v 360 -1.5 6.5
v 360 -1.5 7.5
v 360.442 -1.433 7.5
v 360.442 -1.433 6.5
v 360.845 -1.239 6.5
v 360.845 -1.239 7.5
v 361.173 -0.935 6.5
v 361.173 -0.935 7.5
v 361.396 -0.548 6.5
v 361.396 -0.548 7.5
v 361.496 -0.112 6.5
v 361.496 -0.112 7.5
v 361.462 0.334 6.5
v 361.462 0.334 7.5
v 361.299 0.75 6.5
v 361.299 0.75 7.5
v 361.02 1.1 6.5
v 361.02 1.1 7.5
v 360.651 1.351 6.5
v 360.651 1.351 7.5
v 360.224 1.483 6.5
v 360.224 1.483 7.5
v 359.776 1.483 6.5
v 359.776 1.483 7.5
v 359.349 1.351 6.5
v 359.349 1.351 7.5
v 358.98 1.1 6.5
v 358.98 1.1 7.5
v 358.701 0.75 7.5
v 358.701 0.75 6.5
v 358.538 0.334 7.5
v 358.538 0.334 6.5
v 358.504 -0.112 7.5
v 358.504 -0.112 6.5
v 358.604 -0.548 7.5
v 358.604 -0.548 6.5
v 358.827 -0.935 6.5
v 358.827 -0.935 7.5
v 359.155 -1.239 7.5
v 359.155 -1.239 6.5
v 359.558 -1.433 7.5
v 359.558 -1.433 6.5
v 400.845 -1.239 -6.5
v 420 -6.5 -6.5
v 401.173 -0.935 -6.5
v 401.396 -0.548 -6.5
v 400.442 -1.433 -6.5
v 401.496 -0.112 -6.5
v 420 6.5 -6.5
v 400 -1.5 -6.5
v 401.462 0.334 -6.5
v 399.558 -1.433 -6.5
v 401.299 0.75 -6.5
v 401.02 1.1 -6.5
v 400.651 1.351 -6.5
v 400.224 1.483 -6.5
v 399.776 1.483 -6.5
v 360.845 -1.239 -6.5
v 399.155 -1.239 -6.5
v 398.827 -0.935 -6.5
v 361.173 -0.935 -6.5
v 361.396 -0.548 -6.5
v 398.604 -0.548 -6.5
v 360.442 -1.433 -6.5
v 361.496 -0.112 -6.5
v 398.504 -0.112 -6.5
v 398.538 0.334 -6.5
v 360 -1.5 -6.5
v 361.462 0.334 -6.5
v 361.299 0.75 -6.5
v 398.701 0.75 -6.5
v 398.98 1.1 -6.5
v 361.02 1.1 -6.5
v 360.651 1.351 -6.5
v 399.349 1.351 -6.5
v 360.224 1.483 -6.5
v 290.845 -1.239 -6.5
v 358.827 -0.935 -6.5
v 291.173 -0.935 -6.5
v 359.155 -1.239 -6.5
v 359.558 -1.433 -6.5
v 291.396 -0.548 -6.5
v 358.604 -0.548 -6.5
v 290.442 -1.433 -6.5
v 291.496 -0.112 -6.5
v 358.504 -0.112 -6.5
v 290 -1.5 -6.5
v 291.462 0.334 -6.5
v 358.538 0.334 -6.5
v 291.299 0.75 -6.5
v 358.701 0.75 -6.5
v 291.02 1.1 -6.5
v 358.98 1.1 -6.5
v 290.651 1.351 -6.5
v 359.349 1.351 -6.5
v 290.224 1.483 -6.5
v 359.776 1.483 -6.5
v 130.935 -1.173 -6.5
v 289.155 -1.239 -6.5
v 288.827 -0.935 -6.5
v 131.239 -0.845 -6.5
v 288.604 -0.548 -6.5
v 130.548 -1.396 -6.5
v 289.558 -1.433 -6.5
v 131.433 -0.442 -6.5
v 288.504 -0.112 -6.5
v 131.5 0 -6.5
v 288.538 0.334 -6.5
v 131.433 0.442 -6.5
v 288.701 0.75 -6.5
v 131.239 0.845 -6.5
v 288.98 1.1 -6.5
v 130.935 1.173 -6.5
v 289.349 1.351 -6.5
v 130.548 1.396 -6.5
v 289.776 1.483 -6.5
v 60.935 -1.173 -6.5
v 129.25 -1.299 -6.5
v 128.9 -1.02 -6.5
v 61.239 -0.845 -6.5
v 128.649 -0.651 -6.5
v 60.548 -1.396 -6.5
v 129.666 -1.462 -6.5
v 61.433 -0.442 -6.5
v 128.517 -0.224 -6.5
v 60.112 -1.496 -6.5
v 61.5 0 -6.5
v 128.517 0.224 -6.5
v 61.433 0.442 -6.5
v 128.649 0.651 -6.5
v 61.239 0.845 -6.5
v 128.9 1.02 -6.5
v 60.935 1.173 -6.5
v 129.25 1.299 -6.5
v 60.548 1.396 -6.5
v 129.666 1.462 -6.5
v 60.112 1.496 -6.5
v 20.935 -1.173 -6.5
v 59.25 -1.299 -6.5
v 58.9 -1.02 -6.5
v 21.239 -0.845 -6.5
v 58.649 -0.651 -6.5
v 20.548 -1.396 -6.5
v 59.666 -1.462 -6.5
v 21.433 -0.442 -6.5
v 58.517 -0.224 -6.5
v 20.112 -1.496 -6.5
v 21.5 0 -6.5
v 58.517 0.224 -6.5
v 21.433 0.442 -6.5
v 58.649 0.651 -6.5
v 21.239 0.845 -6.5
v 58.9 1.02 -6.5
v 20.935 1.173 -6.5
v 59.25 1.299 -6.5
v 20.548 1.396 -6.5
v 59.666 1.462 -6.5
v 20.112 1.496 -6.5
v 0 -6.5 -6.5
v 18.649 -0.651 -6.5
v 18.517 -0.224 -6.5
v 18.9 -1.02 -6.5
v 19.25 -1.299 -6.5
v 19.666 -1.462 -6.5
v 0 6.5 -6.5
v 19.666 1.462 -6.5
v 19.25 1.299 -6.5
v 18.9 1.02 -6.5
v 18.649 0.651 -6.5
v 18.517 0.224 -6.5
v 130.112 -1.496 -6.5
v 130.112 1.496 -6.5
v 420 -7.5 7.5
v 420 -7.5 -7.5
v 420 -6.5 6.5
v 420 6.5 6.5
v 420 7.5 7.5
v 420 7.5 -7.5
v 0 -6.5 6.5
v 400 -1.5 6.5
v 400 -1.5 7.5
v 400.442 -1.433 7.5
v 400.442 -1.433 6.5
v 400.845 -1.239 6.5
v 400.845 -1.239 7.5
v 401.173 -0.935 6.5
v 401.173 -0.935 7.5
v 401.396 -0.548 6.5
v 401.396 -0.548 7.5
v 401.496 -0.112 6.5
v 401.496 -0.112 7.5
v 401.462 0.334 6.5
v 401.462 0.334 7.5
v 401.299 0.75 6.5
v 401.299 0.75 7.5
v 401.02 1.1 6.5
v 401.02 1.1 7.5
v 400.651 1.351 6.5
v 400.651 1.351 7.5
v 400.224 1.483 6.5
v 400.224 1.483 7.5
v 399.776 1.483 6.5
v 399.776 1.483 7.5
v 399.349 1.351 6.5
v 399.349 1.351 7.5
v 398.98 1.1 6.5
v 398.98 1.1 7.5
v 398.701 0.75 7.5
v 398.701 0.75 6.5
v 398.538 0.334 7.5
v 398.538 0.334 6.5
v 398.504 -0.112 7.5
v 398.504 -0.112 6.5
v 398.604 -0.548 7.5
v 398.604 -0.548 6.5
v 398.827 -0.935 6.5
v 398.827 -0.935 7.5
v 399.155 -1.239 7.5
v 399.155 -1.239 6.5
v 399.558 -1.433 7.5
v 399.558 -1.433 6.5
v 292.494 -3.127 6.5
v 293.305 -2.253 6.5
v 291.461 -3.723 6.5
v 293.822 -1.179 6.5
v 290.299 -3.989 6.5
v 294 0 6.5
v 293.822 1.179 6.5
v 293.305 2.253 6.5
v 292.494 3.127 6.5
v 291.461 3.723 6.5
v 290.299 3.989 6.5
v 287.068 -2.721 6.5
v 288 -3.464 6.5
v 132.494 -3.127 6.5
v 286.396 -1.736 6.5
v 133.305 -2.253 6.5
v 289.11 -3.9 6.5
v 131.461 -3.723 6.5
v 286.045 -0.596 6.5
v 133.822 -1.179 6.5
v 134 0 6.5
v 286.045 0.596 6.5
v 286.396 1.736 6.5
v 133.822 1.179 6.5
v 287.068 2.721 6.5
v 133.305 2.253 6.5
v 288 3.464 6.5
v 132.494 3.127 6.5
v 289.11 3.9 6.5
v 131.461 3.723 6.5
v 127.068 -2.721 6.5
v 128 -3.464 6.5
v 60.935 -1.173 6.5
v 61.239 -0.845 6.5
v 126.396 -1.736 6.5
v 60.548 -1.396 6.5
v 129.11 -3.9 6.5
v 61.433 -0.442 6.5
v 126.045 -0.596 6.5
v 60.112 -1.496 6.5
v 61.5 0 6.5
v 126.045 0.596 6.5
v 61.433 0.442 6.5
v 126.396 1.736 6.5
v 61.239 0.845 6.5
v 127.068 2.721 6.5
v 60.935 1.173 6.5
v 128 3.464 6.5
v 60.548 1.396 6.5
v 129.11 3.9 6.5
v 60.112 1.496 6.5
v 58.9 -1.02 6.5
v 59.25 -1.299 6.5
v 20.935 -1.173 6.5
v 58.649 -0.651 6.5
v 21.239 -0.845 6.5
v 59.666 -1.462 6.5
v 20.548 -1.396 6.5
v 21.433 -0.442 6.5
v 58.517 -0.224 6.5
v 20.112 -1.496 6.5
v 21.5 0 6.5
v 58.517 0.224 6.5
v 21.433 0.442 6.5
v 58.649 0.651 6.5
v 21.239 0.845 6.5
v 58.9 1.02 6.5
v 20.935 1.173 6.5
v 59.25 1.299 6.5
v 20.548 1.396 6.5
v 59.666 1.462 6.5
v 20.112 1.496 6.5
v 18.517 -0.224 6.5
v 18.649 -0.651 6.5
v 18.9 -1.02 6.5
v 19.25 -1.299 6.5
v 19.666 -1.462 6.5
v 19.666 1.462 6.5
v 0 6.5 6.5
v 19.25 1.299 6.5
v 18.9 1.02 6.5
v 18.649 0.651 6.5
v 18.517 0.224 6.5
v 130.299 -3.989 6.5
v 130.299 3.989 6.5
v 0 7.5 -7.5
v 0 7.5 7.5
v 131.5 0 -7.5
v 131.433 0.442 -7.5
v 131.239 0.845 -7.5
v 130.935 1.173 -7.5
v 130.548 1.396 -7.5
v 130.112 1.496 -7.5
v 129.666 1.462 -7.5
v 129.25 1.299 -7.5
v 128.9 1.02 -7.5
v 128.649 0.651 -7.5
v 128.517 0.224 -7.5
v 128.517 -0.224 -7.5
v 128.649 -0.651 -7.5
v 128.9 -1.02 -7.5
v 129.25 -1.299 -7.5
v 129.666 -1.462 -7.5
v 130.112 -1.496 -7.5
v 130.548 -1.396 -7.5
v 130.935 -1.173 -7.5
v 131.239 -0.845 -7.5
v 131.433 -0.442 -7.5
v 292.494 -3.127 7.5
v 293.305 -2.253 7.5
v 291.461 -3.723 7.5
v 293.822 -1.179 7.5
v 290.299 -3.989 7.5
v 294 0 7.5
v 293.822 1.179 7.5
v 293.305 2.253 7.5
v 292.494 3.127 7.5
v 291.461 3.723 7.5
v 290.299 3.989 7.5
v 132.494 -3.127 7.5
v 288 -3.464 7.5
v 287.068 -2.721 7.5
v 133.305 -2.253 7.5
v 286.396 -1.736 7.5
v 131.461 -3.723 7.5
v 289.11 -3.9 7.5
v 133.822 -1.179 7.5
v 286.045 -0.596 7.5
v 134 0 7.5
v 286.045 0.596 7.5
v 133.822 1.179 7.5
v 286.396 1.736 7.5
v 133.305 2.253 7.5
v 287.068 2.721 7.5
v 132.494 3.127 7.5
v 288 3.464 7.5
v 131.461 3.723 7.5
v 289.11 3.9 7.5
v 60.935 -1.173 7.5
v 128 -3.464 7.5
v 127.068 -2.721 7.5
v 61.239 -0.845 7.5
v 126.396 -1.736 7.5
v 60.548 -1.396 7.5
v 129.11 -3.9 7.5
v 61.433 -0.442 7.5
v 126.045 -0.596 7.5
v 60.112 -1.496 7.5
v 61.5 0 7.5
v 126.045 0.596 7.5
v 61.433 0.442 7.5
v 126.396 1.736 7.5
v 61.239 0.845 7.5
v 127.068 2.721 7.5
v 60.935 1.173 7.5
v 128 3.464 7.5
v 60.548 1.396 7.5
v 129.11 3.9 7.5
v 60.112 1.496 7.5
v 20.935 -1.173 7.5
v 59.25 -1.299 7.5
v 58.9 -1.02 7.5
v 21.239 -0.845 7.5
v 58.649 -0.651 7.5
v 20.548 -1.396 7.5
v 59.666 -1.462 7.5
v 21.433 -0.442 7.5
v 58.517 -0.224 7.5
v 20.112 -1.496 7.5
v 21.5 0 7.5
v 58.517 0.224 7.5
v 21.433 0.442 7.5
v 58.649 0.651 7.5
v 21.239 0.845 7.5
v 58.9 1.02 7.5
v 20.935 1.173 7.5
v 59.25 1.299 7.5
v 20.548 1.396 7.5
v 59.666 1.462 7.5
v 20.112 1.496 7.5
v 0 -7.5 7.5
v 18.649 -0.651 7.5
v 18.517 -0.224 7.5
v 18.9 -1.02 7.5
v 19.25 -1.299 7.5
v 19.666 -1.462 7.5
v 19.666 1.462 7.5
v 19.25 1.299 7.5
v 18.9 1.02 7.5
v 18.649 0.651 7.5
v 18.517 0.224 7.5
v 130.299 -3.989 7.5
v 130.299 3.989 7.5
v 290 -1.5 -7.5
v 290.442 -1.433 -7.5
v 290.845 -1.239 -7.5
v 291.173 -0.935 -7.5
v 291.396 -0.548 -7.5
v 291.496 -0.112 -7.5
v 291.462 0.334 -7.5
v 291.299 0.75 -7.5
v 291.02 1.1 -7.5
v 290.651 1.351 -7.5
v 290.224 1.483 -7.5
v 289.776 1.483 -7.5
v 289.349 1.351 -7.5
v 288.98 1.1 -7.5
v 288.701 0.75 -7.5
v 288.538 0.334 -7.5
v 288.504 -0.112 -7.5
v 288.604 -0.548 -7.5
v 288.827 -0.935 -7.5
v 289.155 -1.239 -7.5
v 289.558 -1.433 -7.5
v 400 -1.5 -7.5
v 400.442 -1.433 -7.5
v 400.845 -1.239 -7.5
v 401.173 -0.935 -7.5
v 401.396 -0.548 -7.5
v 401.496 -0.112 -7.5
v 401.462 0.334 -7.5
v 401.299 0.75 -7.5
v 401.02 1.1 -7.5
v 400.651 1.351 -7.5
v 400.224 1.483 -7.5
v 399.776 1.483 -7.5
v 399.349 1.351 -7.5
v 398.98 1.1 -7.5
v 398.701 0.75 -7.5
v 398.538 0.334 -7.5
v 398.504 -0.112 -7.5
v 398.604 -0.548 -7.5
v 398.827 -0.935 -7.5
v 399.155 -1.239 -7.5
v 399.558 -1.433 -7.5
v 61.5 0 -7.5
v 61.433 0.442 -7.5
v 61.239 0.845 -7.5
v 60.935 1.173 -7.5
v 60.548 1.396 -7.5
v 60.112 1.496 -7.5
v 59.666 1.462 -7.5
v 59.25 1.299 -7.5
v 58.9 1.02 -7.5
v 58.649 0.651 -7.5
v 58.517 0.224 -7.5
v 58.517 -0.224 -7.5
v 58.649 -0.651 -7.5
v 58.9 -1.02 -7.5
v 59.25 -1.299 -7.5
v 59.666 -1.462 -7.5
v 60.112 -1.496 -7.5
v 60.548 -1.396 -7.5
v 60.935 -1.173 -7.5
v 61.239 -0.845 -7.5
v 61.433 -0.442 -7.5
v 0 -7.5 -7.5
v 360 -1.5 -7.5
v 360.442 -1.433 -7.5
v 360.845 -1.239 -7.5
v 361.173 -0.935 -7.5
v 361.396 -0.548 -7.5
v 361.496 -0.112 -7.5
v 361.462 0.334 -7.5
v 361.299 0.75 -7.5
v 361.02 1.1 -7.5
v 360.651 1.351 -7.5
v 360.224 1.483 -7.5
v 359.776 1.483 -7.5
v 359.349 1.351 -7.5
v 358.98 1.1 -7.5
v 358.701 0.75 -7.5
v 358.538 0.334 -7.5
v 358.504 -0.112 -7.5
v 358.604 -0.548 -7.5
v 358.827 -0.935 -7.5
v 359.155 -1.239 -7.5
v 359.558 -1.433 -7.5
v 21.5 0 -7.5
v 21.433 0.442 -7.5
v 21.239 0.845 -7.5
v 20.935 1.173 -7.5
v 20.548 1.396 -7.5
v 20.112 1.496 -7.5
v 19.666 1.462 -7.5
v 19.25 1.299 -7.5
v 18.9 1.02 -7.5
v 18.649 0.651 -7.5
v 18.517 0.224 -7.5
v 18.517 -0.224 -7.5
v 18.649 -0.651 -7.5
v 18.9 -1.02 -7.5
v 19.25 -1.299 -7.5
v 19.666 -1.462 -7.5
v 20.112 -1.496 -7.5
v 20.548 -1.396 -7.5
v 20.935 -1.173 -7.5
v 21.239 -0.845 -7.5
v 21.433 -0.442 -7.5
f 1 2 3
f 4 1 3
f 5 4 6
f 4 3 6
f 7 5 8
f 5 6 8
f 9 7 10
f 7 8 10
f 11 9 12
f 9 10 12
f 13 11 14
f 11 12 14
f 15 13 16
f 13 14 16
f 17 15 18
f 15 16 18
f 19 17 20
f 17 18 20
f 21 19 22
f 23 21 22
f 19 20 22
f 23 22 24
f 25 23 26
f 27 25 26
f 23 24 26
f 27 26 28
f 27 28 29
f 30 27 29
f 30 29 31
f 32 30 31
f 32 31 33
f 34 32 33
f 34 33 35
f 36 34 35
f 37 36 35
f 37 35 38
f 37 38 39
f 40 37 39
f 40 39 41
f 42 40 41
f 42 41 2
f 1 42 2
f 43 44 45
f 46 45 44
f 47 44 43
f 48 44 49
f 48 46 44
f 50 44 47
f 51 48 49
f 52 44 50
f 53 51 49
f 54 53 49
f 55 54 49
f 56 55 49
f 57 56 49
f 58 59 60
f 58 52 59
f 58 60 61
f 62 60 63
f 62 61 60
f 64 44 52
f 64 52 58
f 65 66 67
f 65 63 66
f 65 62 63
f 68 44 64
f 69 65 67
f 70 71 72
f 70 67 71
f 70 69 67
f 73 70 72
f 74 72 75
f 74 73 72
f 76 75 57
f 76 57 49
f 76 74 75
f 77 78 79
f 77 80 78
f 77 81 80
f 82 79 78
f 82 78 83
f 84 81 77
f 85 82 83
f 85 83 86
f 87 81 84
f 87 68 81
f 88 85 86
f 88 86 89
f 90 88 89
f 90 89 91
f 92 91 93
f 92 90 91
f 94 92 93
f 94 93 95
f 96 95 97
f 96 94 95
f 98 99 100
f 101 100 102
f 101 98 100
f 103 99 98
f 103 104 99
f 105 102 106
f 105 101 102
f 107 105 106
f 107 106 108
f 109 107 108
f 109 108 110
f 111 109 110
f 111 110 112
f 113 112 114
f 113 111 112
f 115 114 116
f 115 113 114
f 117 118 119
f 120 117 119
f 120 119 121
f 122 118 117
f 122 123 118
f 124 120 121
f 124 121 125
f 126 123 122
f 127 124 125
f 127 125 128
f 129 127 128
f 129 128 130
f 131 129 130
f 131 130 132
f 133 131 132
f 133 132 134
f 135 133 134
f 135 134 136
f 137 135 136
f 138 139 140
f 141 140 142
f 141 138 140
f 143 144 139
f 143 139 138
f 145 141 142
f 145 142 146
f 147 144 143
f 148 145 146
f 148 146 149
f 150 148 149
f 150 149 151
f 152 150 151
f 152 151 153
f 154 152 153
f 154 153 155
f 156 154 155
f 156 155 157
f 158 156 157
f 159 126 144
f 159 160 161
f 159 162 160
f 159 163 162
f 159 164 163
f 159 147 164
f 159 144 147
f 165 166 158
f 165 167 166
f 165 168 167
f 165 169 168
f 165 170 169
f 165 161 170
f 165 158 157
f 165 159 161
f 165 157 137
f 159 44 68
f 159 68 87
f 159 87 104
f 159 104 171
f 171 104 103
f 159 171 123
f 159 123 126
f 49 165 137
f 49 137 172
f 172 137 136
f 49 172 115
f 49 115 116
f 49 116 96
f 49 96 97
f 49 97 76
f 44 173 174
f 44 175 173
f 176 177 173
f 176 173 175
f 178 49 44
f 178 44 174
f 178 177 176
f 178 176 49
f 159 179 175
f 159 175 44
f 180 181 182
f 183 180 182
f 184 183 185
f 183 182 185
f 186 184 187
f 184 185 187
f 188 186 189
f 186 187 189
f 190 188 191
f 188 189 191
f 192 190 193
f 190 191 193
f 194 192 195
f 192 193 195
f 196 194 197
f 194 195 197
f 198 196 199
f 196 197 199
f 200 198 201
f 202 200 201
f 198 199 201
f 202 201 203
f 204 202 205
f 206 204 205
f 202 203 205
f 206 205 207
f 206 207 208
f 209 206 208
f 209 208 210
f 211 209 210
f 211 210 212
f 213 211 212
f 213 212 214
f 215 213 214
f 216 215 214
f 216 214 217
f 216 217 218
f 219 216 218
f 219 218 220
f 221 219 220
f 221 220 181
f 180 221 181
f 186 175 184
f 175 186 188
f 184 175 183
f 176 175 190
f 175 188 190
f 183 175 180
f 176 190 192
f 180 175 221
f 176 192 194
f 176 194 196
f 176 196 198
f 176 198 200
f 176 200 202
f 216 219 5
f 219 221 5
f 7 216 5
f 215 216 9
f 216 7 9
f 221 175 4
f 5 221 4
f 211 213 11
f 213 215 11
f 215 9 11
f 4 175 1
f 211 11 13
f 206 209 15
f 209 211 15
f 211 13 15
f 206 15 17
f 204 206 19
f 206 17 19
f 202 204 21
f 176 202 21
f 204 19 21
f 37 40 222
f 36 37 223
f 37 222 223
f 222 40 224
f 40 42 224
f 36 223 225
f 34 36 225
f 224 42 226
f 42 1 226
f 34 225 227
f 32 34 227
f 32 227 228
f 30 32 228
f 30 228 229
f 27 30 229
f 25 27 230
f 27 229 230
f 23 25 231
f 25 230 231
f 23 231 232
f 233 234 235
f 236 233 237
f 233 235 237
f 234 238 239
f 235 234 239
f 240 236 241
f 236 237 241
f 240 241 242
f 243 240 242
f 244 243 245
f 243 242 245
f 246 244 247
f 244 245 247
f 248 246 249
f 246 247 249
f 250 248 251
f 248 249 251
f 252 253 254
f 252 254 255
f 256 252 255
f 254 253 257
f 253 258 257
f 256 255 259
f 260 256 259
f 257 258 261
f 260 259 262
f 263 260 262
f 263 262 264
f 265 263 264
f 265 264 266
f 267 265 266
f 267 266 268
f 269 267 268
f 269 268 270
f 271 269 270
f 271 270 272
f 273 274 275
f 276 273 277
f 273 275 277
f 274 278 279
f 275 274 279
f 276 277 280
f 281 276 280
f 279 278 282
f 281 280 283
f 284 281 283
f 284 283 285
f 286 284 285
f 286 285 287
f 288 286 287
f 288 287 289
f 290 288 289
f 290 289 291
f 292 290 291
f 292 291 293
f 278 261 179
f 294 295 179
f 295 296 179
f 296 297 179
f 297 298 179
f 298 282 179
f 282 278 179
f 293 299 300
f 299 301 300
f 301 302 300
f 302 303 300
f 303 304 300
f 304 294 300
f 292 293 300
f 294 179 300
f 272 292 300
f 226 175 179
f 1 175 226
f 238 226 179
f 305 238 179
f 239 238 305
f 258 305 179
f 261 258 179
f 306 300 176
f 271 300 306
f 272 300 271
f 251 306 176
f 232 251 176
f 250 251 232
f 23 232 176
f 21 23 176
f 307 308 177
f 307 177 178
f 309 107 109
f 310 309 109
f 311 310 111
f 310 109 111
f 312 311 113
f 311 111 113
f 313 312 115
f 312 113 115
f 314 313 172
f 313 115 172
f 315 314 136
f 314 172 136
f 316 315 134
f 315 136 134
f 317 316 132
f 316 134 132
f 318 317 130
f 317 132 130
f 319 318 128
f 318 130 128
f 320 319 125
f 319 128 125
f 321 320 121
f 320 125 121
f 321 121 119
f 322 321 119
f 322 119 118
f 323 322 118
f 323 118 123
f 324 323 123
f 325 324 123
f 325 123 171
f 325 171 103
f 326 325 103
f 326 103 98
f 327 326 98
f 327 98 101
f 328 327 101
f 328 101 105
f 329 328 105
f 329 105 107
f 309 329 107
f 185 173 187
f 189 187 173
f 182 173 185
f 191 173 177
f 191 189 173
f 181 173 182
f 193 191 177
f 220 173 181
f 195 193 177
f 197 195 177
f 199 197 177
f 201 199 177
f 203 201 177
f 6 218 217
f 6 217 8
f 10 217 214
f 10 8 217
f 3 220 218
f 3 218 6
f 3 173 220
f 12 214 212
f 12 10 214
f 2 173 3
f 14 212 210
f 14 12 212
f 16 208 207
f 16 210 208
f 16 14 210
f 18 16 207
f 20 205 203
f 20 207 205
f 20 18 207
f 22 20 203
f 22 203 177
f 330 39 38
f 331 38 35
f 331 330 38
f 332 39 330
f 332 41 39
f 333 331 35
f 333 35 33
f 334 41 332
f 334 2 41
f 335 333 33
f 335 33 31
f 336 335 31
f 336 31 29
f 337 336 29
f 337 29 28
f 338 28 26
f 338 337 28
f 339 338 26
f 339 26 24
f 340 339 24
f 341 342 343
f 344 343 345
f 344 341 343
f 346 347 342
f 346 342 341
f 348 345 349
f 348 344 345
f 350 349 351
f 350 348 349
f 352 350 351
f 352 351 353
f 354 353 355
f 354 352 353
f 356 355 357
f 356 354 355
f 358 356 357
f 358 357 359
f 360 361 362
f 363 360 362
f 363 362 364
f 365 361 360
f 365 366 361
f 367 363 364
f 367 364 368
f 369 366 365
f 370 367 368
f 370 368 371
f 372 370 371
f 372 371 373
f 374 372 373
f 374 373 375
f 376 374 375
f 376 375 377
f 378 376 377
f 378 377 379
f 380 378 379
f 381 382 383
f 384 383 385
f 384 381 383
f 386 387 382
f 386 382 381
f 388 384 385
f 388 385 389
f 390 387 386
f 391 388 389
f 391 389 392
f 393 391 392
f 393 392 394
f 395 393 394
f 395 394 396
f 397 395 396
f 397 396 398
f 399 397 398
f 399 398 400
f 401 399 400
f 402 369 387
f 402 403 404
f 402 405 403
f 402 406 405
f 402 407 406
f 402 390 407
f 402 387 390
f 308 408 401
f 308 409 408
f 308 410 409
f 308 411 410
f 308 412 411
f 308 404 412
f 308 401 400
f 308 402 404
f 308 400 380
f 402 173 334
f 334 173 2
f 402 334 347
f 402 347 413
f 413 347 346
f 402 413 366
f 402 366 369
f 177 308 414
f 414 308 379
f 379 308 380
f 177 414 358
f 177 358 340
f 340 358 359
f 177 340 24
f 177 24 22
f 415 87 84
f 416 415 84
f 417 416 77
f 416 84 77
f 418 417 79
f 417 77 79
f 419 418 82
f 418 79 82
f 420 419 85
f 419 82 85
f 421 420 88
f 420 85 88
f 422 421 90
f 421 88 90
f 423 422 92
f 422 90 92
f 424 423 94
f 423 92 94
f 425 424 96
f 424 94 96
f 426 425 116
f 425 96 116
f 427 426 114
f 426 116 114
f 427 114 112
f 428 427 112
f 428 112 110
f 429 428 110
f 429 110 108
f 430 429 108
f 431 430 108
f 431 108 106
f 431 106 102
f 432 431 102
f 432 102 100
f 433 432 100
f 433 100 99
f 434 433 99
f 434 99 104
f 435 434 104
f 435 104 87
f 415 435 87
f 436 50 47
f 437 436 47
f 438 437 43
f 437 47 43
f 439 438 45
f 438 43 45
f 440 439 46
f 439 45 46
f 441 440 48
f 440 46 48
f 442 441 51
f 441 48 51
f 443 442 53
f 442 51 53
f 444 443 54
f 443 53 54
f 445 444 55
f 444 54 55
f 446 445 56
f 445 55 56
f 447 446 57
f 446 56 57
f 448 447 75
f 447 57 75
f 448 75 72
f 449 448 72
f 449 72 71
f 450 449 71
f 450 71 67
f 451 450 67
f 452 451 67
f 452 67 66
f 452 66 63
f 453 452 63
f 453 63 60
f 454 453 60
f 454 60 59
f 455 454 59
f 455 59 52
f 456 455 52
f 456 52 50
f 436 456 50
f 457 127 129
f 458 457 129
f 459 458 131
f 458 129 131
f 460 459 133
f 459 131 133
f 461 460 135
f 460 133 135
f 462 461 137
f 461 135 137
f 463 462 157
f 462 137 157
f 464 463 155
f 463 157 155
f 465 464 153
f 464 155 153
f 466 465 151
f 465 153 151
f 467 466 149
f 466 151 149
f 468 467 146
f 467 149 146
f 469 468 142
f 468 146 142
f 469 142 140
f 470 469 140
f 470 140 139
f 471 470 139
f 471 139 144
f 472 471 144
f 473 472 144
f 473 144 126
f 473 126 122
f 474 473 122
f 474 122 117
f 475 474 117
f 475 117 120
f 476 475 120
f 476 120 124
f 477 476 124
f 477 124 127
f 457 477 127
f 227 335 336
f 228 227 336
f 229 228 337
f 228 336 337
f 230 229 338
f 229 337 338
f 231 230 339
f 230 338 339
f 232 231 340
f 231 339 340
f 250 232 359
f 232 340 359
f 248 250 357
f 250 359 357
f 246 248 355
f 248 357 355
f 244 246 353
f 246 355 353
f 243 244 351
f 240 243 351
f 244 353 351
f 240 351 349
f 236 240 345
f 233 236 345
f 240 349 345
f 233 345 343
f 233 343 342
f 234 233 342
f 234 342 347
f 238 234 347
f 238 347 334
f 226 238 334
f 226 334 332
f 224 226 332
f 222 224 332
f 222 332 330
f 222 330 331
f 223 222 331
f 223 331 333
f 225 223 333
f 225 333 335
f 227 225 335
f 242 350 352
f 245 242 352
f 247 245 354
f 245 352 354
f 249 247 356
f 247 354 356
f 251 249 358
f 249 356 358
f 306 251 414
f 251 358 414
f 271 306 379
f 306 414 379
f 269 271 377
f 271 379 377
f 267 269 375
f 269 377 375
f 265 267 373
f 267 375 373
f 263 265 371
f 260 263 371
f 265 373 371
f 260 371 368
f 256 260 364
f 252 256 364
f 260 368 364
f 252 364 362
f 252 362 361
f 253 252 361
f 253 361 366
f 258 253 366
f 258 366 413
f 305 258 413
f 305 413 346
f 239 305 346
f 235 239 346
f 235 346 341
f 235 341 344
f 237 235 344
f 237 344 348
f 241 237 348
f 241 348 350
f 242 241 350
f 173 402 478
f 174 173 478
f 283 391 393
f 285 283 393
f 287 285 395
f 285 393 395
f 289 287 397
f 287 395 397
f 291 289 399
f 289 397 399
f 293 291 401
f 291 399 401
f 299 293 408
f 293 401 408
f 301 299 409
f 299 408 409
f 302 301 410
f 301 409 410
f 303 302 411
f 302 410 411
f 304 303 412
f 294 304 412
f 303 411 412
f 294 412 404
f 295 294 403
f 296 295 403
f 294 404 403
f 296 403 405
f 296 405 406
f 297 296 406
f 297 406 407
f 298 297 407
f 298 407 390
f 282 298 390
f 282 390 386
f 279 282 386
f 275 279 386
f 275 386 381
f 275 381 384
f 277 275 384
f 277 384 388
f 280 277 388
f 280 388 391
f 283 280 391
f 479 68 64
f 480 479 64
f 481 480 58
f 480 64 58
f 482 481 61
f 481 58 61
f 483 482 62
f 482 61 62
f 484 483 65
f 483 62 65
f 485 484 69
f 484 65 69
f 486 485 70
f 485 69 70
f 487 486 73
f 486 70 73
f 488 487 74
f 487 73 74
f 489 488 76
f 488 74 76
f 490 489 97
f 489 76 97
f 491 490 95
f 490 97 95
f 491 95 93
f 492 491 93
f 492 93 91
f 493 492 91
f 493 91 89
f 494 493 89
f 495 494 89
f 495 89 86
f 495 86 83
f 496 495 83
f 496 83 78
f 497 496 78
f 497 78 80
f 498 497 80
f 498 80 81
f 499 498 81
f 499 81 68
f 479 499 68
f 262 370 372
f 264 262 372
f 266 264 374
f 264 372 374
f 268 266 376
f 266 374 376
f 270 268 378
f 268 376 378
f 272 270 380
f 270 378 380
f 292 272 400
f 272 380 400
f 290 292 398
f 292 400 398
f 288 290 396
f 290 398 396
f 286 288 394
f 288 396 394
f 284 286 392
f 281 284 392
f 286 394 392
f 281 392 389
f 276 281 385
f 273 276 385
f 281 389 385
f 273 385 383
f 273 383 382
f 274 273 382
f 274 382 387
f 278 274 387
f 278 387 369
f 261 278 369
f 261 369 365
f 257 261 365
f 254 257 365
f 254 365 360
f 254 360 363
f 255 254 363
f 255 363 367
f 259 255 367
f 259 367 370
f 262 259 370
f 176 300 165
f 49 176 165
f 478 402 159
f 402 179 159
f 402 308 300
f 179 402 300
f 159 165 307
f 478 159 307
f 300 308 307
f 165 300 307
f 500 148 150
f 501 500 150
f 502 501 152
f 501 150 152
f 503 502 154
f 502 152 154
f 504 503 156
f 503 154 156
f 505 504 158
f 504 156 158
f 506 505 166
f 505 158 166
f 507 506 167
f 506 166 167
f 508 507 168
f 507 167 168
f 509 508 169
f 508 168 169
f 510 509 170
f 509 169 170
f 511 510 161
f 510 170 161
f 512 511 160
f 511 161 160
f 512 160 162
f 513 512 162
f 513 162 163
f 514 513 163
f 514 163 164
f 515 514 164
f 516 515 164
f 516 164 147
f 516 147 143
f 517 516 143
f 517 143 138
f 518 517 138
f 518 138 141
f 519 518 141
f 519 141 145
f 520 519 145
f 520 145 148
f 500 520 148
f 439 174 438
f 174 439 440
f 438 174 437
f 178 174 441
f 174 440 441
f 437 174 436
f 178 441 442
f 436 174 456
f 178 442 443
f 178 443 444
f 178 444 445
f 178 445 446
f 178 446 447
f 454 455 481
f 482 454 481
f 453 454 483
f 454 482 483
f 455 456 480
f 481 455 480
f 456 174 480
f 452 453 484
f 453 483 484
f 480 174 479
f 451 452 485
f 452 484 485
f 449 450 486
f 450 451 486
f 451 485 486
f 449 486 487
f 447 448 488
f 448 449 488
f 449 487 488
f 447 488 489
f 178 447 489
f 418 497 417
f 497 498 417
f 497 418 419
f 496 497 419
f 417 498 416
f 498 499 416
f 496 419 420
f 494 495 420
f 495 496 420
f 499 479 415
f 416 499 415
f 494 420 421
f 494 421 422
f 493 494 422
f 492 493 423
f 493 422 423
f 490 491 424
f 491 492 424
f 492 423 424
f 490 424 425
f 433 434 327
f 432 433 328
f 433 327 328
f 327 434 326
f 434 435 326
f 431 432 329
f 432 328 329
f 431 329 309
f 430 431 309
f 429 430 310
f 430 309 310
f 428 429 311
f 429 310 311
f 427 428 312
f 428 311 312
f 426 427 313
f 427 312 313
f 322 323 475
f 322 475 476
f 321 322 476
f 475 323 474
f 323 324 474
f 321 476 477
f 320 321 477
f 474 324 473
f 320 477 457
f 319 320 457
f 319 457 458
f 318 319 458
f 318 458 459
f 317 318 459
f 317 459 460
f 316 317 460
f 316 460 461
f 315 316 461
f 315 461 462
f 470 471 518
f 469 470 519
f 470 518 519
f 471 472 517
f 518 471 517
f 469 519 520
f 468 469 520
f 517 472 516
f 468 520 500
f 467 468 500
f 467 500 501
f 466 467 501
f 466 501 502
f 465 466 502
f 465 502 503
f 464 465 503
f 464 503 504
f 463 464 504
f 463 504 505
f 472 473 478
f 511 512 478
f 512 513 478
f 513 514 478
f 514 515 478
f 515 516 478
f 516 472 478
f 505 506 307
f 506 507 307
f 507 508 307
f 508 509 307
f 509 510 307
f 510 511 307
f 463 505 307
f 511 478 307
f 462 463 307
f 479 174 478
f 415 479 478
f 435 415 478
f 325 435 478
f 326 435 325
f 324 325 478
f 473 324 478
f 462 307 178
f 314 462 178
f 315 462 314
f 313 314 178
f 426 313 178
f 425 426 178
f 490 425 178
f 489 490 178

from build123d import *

# Parameters (mm, degrees)
SKETCH_1_W          = 15
SKETCH_1_H          = 15
SKETCH_1_W_2        = 13
SKETCH_1_H_2        = 13
EXTRUDE_1_DEPTH     = 420
SKETCH_2_R          = 1.5
CUT_EXTRUDE_1_DEPTH = 421.334688076
SKETCH_3_R          = 4
CUT_EXTRUDE_2_DEPTH = 10


with BuildPart() as part:
    # 草图1 → 凸台-拉伸1 (new body)
    with BuildSketch(Plane(origin=(0, 0, 0), x_dir=(0, 0, -1), z_dir=(1, 0, 0))):
        Rectangle(SKETCH_1_W, SKETCH_1_H)
        Rectangle(SKETCH_1_W_2, SKETCH_1_H_2, mode=Mode.SUBTRACT)
    extrude(amount=EXTRUDE_1_DEPTH)

    # 草图2 → 切除-拉伸1 (cut, through all)
    with BuildSketch(Plane.XY.offset(7.5)):
        with Locations((20, 0)):
            Circle(SKETCH_2_R)
        with Locations((60, 0)):
            Circle(SKETCH_2_R)
        with Locations((130, 0)):
            Circle(SKETCH_2_R)
        with Locations(Location((290, 0, 0), (0, 0, 270))):
            Circle(SKETCH_2_R)
        with Locations(Location((360, 0, 0), (0, 0, 270))):
            Circle(SKETCH_2_R)
        with Locations(Location((400, 0, 0), (0, 0, 270))):
            Circle(SKETCH_2_R)
    extrude(amount=-CUT_EXTRUDE_1_DEPTH, mode=Mode.SUBTRACT)

    # 草图3 → 切除-拉伸2 (cut)
    with BuildSketch(Plane.XY.offset(7.5)):
        with Locations((130, 0)):
            Circle(SKETCH_3_R)
        with Locations((290, 0)):
            Circle(SKETCH_3_R)
    extrude(amount=-CUT_EXTRUDE_2_DEPTH, mode=Mode.SUBTRACT)


solid = part.part
